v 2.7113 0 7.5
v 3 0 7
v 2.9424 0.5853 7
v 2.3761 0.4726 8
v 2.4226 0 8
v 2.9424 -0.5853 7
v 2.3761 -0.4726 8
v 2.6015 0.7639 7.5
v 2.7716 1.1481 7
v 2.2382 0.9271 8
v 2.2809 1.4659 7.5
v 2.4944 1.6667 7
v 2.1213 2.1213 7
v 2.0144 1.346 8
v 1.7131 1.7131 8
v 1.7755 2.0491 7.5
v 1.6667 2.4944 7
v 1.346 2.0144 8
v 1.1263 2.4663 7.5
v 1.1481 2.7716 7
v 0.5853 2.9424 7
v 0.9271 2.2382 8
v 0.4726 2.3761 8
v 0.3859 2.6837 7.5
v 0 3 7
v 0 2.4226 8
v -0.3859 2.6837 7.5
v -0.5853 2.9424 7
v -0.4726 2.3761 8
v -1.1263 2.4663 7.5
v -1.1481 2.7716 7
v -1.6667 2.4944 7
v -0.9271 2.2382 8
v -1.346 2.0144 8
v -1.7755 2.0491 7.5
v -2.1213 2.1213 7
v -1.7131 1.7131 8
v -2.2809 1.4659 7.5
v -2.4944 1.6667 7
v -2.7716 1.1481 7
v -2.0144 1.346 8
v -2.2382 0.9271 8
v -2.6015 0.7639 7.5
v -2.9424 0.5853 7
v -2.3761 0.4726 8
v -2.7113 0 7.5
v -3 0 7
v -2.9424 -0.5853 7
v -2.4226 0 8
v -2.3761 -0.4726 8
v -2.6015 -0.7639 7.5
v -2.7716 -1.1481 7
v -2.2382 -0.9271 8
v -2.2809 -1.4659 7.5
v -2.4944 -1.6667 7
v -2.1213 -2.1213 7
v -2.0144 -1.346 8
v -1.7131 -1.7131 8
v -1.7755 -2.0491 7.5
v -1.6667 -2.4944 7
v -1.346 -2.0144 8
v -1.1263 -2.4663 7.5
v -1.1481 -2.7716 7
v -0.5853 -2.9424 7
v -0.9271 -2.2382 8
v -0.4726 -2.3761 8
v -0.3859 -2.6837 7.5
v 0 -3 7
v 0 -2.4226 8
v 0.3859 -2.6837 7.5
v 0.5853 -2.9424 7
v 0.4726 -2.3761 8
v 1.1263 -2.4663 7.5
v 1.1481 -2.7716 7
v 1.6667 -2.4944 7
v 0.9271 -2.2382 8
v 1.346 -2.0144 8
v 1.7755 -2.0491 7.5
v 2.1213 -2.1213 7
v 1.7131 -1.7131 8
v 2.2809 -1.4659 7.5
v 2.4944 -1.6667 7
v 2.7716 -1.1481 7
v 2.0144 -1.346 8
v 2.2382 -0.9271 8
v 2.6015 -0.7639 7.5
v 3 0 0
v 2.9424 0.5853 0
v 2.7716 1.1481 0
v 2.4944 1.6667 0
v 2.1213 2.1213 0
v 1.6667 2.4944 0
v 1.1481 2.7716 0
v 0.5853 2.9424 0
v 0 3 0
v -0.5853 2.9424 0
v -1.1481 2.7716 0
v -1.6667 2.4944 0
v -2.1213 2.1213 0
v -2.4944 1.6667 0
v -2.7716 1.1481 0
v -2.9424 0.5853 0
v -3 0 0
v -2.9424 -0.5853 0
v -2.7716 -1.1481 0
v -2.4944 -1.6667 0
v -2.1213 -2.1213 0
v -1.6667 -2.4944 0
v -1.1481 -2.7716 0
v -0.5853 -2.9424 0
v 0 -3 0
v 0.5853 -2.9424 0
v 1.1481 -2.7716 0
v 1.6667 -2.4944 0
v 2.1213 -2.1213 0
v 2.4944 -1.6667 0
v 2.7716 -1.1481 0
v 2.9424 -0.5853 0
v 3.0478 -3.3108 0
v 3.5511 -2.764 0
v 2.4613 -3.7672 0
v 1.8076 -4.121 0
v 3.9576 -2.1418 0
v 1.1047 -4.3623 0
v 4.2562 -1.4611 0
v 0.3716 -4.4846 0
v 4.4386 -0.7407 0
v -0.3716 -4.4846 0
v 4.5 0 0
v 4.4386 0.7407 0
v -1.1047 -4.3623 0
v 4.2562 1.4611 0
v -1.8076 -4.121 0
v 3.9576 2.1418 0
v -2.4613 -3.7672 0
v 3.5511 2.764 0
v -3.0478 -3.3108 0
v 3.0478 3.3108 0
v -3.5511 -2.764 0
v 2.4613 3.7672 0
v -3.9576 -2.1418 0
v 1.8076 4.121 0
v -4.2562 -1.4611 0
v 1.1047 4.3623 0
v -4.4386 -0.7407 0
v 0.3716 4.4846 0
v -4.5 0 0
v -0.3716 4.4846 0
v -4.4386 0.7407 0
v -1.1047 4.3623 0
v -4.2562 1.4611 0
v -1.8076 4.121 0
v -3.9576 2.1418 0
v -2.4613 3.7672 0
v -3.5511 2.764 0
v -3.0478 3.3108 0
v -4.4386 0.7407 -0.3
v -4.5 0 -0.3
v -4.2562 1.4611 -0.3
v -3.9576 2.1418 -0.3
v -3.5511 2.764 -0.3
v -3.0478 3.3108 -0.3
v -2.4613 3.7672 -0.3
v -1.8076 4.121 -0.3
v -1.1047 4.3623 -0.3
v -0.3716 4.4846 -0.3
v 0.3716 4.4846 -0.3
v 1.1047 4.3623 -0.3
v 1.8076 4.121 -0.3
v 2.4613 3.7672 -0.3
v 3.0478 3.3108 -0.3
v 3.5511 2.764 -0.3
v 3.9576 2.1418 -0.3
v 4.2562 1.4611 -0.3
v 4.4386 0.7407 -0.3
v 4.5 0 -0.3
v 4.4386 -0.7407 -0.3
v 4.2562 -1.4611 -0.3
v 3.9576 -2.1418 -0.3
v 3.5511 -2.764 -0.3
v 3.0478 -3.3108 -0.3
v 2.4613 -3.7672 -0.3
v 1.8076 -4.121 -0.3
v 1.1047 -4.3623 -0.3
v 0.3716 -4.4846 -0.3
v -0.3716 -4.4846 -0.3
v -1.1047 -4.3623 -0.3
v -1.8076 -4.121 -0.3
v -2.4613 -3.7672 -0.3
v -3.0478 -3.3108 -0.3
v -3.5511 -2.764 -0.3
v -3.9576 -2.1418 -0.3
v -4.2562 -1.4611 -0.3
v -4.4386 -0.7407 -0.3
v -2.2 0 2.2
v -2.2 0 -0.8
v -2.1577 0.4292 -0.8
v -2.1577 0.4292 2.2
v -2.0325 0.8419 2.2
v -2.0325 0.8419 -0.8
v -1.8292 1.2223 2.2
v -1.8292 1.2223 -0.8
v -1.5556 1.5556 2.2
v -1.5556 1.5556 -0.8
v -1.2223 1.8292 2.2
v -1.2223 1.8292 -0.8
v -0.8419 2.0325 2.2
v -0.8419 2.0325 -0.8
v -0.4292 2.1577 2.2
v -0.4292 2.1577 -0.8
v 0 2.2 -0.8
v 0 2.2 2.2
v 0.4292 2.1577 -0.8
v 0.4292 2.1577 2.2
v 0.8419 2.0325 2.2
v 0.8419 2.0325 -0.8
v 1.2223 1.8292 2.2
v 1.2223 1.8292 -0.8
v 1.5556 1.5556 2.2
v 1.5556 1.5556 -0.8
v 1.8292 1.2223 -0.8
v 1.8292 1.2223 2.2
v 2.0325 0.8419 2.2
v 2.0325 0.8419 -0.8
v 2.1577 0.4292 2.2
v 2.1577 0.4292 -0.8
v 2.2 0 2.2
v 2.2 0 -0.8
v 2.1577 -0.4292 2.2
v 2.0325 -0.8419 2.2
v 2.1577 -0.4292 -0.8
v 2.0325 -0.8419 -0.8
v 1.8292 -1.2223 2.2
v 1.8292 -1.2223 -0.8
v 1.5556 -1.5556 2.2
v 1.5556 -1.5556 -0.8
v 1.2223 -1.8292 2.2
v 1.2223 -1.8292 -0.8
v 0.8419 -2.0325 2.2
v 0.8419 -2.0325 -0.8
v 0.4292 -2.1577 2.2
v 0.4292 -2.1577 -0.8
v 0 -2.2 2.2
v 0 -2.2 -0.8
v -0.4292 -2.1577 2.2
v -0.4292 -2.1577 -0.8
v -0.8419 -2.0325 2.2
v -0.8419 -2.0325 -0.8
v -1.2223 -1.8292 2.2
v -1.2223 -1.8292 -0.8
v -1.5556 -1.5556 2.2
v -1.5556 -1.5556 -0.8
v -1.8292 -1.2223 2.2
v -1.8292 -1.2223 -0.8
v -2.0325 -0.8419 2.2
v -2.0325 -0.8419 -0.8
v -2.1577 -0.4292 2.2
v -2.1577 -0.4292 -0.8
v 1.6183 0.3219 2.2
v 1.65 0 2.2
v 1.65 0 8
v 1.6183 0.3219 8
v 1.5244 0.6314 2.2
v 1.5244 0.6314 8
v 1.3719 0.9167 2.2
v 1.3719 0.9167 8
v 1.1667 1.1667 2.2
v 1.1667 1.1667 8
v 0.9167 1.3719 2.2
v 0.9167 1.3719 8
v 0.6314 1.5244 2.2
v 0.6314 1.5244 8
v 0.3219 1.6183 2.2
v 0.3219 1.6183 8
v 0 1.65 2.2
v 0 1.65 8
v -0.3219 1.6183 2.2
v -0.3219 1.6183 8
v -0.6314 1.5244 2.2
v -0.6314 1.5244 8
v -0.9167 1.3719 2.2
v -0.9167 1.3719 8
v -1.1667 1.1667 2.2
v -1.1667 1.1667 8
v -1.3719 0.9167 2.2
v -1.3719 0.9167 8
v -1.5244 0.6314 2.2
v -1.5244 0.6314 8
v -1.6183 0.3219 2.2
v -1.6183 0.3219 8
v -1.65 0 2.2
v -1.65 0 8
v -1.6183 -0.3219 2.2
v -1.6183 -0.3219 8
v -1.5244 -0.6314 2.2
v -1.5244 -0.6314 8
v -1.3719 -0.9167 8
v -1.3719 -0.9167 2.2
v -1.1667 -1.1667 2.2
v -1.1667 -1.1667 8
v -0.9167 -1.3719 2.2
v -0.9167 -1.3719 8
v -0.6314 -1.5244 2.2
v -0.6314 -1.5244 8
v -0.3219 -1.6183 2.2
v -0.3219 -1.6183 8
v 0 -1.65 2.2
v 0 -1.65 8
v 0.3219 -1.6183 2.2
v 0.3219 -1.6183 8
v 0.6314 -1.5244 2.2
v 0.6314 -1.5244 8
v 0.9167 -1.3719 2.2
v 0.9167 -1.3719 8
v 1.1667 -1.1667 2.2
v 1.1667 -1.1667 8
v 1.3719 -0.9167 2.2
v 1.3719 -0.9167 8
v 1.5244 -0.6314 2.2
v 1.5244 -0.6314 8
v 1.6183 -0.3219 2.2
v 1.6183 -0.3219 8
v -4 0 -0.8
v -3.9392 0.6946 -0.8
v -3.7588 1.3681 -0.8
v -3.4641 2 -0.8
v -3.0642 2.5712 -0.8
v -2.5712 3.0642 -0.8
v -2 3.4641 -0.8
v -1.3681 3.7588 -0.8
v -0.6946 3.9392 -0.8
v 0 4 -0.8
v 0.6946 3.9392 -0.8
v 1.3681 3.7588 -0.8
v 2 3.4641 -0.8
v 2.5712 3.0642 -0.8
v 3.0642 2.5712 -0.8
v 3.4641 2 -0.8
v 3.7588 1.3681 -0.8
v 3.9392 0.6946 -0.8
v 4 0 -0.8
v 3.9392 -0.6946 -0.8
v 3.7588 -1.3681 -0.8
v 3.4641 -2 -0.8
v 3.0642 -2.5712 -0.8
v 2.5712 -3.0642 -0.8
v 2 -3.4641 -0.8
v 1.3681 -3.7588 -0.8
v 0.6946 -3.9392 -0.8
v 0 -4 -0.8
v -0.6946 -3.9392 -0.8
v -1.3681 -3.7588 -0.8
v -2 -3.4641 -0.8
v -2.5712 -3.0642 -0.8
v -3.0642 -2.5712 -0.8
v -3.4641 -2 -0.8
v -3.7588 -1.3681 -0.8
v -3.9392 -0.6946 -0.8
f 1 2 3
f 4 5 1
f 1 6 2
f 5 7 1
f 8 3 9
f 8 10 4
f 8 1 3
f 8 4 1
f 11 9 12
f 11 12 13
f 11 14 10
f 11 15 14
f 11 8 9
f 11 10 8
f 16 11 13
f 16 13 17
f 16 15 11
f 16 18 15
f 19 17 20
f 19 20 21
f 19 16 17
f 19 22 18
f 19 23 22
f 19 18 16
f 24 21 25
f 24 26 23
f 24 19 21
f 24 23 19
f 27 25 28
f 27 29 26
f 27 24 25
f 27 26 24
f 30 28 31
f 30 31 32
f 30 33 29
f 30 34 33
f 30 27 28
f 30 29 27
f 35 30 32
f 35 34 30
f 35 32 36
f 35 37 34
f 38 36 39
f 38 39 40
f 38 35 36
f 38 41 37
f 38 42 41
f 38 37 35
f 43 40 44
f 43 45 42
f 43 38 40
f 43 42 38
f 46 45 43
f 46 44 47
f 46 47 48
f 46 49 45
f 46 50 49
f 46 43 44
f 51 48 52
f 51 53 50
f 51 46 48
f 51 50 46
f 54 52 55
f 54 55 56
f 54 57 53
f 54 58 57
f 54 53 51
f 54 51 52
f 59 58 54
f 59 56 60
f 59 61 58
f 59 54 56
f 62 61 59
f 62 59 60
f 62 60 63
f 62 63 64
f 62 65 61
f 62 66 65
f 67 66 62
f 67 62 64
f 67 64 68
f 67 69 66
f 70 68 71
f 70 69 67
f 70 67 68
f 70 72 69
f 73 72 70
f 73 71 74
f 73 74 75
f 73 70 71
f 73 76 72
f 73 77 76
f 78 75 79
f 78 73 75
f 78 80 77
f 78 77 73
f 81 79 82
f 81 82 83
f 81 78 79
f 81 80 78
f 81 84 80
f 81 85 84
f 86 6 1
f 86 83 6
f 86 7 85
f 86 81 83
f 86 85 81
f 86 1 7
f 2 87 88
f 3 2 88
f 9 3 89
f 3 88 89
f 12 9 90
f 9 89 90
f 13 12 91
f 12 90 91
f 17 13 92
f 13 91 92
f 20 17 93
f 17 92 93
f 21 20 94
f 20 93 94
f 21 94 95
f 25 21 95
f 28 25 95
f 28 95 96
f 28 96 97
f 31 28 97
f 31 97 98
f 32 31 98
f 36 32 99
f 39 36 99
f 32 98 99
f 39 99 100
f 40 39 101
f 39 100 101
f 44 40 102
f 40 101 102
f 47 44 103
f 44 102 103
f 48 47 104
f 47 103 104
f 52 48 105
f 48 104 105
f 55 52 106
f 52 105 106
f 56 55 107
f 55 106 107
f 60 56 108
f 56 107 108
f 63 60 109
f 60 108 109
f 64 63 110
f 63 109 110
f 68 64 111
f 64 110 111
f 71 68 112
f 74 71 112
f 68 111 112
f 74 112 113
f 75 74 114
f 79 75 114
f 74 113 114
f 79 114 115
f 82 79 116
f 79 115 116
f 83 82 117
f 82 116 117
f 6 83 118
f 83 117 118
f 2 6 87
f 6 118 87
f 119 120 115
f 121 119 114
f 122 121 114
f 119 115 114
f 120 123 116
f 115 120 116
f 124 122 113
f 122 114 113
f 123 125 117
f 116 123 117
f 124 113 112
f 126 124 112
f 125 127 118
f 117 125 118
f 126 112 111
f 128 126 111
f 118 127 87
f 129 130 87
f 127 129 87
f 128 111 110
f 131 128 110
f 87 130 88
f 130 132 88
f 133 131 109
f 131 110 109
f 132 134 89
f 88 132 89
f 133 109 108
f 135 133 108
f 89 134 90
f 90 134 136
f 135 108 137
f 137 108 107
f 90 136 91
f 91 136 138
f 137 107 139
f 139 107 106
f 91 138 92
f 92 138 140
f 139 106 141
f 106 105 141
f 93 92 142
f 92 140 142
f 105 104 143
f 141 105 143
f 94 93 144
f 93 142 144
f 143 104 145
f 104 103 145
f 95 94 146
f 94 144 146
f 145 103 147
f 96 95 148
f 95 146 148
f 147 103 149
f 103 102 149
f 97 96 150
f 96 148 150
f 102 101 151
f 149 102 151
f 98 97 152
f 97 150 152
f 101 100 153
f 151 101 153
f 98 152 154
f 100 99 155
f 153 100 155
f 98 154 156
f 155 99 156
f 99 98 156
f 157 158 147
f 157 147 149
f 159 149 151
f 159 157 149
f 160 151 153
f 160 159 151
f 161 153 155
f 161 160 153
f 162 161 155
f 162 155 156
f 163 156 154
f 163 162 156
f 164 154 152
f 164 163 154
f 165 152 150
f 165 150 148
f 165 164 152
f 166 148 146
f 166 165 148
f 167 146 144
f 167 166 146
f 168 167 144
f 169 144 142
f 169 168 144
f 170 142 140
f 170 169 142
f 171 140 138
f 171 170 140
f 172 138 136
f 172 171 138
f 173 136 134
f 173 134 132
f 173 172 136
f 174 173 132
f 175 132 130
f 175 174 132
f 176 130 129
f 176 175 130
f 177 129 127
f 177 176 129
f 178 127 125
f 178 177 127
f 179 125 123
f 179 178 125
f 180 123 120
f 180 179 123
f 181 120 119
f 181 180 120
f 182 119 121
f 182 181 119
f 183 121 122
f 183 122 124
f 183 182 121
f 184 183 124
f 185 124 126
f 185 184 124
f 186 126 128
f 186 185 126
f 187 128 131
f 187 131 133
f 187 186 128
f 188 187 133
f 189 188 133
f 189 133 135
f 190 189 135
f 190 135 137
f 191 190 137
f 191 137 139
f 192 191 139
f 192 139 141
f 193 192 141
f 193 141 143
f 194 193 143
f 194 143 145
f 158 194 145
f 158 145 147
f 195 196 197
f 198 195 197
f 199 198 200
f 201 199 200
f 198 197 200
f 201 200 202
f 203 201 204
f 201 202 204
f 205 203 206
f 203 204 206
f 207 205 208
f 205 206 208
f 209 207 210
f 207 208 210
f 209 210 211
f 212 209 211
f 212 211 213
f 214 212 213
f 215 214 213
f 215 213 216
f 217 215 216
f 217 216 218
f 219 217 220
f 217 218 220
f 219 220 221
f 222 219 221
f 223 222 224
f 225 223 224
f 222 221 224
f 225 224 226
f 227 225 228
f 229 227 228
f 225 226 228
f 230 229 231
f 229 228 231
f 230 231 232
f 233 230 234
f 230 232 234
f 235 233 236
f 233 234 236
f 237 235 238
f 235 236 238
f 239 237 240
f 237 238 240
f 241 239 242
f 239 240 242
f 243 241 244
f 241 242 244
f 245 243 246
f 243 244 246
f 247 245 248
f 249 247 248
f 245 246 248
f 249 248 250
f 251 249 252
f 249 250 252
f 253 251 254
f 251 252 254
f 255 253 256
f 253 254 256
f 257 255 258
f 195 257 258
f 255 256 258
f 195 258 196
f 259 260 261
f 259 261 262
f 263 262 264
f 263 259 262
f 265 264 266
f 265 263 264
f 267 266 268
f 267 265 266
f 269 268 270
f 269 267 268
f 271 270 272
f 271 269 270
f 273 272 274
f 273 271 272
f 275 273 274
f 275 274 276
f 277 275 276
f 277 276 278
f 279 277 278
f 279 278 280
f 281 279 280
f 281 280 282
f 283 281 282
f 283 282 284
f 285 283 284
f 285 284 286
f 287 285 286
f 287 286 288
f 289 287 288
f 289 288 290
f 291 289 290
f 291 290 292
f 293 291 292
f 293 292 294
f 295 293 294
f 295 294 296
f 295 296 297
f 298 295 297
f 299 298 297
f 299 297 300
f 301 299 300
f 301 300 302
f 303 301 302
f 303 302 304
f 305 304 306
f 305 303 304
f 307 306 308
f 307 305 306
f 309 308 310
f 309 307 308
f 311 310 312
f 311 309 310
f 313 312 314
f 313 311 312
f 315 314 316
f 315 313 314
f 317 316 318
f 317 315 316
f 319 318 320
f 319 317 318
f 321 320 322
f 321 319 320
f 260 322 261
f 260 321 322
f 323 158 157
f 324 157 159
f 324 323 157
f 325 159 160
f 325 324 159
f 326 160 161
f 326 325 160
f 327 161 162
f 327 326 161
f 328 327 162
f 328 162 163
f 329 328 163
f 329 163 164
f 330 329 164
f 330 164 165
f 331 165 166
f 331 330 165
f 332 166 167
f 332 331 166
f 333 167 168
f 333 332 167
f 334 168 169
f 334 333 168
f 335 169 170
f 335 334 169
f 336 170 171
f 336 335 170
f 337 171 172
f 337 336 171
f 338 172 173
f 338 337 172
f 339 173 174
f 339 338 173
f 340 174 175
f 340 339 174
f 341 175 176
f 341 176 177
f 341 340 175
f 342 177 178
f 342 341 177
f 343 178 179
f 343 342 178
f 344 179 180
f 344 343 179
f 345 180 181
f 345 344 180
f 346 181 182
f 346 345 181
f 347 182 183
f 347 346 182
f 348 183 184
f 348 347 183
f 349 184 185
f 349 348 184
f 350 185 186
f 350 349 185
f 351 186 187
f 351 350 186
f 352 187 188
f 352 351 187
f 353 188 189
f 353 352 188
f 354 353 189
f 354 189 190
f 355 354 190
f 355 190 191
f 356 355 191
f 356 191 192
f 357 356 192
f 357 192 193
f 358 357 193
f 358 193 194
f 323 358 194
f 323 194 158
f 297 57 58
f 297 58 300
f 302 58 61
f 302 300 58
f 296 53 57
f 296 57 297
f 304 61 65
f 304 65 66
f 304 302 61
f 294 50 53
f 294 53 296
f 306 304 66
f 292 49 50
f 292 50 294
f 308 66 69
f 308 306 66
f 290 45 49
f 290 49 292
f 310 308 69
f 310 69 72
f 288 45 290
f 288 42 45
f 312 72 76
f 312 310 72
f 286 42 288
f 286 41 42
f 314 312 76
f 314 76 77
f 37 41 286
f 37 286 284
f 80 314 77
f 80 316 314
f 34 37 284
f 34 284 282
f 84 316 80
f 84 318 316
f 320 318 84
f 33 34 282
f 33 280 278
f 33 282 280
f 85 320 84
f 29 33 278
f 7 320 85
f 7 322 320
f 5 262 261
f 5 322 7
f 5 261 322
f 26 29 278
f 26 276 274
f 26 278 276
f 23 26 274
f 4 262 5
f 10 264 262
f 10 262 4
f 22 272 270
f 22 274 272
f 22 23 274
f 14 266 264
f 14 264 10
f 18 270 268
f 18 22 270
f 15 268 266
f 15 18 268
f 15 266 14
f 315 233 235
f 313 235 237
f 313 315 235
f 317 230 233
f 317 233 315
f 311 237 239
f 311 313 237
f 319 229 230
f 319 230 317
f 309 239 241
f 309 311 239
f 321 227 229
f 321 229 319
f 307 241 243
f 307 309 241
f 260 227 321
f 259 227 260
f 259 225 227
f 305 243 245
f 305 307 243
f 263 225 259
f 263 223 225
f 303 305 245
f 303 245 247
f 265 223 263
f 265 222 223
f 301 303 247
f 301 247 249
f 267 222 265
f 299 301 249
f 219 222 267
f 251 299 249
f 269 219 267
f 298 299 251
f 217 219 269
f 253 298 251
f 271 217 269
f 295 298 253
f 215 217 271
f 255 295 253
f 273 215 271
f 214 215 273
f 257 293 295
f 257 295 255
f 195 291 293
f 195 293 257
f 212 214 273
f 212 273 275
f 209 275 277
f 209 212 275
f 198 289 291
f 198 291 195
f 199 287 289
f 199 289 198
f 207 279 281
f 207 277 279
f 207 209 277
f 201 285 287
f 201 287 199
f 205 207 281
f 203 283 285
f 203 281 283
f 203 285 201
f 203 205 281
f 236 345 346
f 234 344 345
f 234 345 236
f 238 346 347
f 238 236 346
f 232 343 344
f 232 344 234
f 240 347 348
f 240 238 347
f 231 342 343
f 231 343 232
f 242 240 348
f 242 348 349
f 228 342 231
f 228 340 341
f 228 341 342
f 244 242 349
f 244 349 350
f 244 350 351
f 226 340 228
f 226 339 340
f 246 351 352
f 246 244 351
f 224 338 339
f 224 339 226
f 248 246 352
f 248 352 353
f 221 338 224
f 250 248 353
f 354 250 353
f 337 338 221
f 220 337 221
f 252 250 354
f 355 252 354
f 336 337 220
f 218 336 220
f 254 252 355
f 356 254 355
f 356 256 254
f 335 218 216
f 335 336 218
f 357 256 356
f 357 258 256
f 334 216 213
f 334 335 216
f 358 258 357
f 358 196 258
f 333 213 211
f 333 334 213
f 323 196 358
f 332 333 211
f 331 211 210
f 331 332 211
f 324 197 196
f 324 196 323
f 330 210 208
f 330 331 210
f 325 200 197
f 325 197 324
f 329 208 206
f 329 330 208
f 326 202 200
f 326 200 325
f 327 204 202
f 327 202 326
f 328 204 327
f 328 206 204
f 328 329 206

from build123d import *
from build123d.topology import SkipClean

# Parameters (mm, degrees)
SKETCH_1_R          = 3
SKETCH_1_R_2        = 1.65
EXTRUDE_1_DEPTH     = 8
EXTRUDE_START       = 0.8
SKETCH_2_R          = 4.5
SKETCH_2_R_2        = 1.65
EXTRUDE_2_DEPTH     = 0.8
SKETCH_3_R          = 2.2
CUT_EXTRUDE_1_DEPTH = 3
CHAMFER_1_SIZE      = 0.5
CHAMFER_2_SIZE      = 1
CHAMFER_2_SIZE2     = 0.577350269


with BuildPart() as part:
    # 草图1 → 凸台-拉伸1 (new body)
    with BuildSketch(Plane.XY):
        Circle(SKETCH_1_R)
        Circle(SKETCH_1_R_2, mode=Mode.SUBTRACT)
    extrude(amount=EXTRUDE_1_DEPTH)

    # 草图2 → 凸台-拉伸2 (add)
    with SkipClean():  # the faces are left unmerged after this step: merging them gives an invalid solid
        with BuildSketch(Plane(origin=(0, 0, 0), x_dir=(-1, 0, 0), z_dir=(0, 0, -1)).offset(EXTRUDE_START)):
            Circle(SKETCH_2_R)
            Circle(SKETCH_2_R_2, mode=Mode.SUBTRACT)
        extrude(amount=-EXTRUDE_2_DEPTH)

    # 草图3 → 切除-拉伸1 (cut)
    with BuildSketch(Plane(origin=(0, 0, -0.8), x_dir=(-1, 0, 0), z_dir=(0, 0, -1))):
        Circle(SKETCH_3_R)
    extrude(amount=-CUT_EXTRUDE_1_DEPTH, mode=Mode.SUBTRACT)

    # 倒角1
    chamfer_1_edges = [part.edges().sort_by_distance(p)[0] for p in [
        (4.5, 0, -0.8),
    ]]
    chamfer(chamfer_1_edges, length=CHAMFER_1_SIZE)

    # 倒角2
    chamfer_2_edges = [part.edges().sort_by_distance(p)[0] for p in [
        (-3, 0, 8),
    ]]
    chamfer_2_side = [part.faces().sort_by_distance(p)[0] for p in [
        (-3, 0, 4),
    ]]
    chamfer(chamfer_2_edges, length=CHAMFER_2_SIZE, length2=CHAMFER_2_SIZE2, reference=chamfer_2_side[0])


solid = part.part
